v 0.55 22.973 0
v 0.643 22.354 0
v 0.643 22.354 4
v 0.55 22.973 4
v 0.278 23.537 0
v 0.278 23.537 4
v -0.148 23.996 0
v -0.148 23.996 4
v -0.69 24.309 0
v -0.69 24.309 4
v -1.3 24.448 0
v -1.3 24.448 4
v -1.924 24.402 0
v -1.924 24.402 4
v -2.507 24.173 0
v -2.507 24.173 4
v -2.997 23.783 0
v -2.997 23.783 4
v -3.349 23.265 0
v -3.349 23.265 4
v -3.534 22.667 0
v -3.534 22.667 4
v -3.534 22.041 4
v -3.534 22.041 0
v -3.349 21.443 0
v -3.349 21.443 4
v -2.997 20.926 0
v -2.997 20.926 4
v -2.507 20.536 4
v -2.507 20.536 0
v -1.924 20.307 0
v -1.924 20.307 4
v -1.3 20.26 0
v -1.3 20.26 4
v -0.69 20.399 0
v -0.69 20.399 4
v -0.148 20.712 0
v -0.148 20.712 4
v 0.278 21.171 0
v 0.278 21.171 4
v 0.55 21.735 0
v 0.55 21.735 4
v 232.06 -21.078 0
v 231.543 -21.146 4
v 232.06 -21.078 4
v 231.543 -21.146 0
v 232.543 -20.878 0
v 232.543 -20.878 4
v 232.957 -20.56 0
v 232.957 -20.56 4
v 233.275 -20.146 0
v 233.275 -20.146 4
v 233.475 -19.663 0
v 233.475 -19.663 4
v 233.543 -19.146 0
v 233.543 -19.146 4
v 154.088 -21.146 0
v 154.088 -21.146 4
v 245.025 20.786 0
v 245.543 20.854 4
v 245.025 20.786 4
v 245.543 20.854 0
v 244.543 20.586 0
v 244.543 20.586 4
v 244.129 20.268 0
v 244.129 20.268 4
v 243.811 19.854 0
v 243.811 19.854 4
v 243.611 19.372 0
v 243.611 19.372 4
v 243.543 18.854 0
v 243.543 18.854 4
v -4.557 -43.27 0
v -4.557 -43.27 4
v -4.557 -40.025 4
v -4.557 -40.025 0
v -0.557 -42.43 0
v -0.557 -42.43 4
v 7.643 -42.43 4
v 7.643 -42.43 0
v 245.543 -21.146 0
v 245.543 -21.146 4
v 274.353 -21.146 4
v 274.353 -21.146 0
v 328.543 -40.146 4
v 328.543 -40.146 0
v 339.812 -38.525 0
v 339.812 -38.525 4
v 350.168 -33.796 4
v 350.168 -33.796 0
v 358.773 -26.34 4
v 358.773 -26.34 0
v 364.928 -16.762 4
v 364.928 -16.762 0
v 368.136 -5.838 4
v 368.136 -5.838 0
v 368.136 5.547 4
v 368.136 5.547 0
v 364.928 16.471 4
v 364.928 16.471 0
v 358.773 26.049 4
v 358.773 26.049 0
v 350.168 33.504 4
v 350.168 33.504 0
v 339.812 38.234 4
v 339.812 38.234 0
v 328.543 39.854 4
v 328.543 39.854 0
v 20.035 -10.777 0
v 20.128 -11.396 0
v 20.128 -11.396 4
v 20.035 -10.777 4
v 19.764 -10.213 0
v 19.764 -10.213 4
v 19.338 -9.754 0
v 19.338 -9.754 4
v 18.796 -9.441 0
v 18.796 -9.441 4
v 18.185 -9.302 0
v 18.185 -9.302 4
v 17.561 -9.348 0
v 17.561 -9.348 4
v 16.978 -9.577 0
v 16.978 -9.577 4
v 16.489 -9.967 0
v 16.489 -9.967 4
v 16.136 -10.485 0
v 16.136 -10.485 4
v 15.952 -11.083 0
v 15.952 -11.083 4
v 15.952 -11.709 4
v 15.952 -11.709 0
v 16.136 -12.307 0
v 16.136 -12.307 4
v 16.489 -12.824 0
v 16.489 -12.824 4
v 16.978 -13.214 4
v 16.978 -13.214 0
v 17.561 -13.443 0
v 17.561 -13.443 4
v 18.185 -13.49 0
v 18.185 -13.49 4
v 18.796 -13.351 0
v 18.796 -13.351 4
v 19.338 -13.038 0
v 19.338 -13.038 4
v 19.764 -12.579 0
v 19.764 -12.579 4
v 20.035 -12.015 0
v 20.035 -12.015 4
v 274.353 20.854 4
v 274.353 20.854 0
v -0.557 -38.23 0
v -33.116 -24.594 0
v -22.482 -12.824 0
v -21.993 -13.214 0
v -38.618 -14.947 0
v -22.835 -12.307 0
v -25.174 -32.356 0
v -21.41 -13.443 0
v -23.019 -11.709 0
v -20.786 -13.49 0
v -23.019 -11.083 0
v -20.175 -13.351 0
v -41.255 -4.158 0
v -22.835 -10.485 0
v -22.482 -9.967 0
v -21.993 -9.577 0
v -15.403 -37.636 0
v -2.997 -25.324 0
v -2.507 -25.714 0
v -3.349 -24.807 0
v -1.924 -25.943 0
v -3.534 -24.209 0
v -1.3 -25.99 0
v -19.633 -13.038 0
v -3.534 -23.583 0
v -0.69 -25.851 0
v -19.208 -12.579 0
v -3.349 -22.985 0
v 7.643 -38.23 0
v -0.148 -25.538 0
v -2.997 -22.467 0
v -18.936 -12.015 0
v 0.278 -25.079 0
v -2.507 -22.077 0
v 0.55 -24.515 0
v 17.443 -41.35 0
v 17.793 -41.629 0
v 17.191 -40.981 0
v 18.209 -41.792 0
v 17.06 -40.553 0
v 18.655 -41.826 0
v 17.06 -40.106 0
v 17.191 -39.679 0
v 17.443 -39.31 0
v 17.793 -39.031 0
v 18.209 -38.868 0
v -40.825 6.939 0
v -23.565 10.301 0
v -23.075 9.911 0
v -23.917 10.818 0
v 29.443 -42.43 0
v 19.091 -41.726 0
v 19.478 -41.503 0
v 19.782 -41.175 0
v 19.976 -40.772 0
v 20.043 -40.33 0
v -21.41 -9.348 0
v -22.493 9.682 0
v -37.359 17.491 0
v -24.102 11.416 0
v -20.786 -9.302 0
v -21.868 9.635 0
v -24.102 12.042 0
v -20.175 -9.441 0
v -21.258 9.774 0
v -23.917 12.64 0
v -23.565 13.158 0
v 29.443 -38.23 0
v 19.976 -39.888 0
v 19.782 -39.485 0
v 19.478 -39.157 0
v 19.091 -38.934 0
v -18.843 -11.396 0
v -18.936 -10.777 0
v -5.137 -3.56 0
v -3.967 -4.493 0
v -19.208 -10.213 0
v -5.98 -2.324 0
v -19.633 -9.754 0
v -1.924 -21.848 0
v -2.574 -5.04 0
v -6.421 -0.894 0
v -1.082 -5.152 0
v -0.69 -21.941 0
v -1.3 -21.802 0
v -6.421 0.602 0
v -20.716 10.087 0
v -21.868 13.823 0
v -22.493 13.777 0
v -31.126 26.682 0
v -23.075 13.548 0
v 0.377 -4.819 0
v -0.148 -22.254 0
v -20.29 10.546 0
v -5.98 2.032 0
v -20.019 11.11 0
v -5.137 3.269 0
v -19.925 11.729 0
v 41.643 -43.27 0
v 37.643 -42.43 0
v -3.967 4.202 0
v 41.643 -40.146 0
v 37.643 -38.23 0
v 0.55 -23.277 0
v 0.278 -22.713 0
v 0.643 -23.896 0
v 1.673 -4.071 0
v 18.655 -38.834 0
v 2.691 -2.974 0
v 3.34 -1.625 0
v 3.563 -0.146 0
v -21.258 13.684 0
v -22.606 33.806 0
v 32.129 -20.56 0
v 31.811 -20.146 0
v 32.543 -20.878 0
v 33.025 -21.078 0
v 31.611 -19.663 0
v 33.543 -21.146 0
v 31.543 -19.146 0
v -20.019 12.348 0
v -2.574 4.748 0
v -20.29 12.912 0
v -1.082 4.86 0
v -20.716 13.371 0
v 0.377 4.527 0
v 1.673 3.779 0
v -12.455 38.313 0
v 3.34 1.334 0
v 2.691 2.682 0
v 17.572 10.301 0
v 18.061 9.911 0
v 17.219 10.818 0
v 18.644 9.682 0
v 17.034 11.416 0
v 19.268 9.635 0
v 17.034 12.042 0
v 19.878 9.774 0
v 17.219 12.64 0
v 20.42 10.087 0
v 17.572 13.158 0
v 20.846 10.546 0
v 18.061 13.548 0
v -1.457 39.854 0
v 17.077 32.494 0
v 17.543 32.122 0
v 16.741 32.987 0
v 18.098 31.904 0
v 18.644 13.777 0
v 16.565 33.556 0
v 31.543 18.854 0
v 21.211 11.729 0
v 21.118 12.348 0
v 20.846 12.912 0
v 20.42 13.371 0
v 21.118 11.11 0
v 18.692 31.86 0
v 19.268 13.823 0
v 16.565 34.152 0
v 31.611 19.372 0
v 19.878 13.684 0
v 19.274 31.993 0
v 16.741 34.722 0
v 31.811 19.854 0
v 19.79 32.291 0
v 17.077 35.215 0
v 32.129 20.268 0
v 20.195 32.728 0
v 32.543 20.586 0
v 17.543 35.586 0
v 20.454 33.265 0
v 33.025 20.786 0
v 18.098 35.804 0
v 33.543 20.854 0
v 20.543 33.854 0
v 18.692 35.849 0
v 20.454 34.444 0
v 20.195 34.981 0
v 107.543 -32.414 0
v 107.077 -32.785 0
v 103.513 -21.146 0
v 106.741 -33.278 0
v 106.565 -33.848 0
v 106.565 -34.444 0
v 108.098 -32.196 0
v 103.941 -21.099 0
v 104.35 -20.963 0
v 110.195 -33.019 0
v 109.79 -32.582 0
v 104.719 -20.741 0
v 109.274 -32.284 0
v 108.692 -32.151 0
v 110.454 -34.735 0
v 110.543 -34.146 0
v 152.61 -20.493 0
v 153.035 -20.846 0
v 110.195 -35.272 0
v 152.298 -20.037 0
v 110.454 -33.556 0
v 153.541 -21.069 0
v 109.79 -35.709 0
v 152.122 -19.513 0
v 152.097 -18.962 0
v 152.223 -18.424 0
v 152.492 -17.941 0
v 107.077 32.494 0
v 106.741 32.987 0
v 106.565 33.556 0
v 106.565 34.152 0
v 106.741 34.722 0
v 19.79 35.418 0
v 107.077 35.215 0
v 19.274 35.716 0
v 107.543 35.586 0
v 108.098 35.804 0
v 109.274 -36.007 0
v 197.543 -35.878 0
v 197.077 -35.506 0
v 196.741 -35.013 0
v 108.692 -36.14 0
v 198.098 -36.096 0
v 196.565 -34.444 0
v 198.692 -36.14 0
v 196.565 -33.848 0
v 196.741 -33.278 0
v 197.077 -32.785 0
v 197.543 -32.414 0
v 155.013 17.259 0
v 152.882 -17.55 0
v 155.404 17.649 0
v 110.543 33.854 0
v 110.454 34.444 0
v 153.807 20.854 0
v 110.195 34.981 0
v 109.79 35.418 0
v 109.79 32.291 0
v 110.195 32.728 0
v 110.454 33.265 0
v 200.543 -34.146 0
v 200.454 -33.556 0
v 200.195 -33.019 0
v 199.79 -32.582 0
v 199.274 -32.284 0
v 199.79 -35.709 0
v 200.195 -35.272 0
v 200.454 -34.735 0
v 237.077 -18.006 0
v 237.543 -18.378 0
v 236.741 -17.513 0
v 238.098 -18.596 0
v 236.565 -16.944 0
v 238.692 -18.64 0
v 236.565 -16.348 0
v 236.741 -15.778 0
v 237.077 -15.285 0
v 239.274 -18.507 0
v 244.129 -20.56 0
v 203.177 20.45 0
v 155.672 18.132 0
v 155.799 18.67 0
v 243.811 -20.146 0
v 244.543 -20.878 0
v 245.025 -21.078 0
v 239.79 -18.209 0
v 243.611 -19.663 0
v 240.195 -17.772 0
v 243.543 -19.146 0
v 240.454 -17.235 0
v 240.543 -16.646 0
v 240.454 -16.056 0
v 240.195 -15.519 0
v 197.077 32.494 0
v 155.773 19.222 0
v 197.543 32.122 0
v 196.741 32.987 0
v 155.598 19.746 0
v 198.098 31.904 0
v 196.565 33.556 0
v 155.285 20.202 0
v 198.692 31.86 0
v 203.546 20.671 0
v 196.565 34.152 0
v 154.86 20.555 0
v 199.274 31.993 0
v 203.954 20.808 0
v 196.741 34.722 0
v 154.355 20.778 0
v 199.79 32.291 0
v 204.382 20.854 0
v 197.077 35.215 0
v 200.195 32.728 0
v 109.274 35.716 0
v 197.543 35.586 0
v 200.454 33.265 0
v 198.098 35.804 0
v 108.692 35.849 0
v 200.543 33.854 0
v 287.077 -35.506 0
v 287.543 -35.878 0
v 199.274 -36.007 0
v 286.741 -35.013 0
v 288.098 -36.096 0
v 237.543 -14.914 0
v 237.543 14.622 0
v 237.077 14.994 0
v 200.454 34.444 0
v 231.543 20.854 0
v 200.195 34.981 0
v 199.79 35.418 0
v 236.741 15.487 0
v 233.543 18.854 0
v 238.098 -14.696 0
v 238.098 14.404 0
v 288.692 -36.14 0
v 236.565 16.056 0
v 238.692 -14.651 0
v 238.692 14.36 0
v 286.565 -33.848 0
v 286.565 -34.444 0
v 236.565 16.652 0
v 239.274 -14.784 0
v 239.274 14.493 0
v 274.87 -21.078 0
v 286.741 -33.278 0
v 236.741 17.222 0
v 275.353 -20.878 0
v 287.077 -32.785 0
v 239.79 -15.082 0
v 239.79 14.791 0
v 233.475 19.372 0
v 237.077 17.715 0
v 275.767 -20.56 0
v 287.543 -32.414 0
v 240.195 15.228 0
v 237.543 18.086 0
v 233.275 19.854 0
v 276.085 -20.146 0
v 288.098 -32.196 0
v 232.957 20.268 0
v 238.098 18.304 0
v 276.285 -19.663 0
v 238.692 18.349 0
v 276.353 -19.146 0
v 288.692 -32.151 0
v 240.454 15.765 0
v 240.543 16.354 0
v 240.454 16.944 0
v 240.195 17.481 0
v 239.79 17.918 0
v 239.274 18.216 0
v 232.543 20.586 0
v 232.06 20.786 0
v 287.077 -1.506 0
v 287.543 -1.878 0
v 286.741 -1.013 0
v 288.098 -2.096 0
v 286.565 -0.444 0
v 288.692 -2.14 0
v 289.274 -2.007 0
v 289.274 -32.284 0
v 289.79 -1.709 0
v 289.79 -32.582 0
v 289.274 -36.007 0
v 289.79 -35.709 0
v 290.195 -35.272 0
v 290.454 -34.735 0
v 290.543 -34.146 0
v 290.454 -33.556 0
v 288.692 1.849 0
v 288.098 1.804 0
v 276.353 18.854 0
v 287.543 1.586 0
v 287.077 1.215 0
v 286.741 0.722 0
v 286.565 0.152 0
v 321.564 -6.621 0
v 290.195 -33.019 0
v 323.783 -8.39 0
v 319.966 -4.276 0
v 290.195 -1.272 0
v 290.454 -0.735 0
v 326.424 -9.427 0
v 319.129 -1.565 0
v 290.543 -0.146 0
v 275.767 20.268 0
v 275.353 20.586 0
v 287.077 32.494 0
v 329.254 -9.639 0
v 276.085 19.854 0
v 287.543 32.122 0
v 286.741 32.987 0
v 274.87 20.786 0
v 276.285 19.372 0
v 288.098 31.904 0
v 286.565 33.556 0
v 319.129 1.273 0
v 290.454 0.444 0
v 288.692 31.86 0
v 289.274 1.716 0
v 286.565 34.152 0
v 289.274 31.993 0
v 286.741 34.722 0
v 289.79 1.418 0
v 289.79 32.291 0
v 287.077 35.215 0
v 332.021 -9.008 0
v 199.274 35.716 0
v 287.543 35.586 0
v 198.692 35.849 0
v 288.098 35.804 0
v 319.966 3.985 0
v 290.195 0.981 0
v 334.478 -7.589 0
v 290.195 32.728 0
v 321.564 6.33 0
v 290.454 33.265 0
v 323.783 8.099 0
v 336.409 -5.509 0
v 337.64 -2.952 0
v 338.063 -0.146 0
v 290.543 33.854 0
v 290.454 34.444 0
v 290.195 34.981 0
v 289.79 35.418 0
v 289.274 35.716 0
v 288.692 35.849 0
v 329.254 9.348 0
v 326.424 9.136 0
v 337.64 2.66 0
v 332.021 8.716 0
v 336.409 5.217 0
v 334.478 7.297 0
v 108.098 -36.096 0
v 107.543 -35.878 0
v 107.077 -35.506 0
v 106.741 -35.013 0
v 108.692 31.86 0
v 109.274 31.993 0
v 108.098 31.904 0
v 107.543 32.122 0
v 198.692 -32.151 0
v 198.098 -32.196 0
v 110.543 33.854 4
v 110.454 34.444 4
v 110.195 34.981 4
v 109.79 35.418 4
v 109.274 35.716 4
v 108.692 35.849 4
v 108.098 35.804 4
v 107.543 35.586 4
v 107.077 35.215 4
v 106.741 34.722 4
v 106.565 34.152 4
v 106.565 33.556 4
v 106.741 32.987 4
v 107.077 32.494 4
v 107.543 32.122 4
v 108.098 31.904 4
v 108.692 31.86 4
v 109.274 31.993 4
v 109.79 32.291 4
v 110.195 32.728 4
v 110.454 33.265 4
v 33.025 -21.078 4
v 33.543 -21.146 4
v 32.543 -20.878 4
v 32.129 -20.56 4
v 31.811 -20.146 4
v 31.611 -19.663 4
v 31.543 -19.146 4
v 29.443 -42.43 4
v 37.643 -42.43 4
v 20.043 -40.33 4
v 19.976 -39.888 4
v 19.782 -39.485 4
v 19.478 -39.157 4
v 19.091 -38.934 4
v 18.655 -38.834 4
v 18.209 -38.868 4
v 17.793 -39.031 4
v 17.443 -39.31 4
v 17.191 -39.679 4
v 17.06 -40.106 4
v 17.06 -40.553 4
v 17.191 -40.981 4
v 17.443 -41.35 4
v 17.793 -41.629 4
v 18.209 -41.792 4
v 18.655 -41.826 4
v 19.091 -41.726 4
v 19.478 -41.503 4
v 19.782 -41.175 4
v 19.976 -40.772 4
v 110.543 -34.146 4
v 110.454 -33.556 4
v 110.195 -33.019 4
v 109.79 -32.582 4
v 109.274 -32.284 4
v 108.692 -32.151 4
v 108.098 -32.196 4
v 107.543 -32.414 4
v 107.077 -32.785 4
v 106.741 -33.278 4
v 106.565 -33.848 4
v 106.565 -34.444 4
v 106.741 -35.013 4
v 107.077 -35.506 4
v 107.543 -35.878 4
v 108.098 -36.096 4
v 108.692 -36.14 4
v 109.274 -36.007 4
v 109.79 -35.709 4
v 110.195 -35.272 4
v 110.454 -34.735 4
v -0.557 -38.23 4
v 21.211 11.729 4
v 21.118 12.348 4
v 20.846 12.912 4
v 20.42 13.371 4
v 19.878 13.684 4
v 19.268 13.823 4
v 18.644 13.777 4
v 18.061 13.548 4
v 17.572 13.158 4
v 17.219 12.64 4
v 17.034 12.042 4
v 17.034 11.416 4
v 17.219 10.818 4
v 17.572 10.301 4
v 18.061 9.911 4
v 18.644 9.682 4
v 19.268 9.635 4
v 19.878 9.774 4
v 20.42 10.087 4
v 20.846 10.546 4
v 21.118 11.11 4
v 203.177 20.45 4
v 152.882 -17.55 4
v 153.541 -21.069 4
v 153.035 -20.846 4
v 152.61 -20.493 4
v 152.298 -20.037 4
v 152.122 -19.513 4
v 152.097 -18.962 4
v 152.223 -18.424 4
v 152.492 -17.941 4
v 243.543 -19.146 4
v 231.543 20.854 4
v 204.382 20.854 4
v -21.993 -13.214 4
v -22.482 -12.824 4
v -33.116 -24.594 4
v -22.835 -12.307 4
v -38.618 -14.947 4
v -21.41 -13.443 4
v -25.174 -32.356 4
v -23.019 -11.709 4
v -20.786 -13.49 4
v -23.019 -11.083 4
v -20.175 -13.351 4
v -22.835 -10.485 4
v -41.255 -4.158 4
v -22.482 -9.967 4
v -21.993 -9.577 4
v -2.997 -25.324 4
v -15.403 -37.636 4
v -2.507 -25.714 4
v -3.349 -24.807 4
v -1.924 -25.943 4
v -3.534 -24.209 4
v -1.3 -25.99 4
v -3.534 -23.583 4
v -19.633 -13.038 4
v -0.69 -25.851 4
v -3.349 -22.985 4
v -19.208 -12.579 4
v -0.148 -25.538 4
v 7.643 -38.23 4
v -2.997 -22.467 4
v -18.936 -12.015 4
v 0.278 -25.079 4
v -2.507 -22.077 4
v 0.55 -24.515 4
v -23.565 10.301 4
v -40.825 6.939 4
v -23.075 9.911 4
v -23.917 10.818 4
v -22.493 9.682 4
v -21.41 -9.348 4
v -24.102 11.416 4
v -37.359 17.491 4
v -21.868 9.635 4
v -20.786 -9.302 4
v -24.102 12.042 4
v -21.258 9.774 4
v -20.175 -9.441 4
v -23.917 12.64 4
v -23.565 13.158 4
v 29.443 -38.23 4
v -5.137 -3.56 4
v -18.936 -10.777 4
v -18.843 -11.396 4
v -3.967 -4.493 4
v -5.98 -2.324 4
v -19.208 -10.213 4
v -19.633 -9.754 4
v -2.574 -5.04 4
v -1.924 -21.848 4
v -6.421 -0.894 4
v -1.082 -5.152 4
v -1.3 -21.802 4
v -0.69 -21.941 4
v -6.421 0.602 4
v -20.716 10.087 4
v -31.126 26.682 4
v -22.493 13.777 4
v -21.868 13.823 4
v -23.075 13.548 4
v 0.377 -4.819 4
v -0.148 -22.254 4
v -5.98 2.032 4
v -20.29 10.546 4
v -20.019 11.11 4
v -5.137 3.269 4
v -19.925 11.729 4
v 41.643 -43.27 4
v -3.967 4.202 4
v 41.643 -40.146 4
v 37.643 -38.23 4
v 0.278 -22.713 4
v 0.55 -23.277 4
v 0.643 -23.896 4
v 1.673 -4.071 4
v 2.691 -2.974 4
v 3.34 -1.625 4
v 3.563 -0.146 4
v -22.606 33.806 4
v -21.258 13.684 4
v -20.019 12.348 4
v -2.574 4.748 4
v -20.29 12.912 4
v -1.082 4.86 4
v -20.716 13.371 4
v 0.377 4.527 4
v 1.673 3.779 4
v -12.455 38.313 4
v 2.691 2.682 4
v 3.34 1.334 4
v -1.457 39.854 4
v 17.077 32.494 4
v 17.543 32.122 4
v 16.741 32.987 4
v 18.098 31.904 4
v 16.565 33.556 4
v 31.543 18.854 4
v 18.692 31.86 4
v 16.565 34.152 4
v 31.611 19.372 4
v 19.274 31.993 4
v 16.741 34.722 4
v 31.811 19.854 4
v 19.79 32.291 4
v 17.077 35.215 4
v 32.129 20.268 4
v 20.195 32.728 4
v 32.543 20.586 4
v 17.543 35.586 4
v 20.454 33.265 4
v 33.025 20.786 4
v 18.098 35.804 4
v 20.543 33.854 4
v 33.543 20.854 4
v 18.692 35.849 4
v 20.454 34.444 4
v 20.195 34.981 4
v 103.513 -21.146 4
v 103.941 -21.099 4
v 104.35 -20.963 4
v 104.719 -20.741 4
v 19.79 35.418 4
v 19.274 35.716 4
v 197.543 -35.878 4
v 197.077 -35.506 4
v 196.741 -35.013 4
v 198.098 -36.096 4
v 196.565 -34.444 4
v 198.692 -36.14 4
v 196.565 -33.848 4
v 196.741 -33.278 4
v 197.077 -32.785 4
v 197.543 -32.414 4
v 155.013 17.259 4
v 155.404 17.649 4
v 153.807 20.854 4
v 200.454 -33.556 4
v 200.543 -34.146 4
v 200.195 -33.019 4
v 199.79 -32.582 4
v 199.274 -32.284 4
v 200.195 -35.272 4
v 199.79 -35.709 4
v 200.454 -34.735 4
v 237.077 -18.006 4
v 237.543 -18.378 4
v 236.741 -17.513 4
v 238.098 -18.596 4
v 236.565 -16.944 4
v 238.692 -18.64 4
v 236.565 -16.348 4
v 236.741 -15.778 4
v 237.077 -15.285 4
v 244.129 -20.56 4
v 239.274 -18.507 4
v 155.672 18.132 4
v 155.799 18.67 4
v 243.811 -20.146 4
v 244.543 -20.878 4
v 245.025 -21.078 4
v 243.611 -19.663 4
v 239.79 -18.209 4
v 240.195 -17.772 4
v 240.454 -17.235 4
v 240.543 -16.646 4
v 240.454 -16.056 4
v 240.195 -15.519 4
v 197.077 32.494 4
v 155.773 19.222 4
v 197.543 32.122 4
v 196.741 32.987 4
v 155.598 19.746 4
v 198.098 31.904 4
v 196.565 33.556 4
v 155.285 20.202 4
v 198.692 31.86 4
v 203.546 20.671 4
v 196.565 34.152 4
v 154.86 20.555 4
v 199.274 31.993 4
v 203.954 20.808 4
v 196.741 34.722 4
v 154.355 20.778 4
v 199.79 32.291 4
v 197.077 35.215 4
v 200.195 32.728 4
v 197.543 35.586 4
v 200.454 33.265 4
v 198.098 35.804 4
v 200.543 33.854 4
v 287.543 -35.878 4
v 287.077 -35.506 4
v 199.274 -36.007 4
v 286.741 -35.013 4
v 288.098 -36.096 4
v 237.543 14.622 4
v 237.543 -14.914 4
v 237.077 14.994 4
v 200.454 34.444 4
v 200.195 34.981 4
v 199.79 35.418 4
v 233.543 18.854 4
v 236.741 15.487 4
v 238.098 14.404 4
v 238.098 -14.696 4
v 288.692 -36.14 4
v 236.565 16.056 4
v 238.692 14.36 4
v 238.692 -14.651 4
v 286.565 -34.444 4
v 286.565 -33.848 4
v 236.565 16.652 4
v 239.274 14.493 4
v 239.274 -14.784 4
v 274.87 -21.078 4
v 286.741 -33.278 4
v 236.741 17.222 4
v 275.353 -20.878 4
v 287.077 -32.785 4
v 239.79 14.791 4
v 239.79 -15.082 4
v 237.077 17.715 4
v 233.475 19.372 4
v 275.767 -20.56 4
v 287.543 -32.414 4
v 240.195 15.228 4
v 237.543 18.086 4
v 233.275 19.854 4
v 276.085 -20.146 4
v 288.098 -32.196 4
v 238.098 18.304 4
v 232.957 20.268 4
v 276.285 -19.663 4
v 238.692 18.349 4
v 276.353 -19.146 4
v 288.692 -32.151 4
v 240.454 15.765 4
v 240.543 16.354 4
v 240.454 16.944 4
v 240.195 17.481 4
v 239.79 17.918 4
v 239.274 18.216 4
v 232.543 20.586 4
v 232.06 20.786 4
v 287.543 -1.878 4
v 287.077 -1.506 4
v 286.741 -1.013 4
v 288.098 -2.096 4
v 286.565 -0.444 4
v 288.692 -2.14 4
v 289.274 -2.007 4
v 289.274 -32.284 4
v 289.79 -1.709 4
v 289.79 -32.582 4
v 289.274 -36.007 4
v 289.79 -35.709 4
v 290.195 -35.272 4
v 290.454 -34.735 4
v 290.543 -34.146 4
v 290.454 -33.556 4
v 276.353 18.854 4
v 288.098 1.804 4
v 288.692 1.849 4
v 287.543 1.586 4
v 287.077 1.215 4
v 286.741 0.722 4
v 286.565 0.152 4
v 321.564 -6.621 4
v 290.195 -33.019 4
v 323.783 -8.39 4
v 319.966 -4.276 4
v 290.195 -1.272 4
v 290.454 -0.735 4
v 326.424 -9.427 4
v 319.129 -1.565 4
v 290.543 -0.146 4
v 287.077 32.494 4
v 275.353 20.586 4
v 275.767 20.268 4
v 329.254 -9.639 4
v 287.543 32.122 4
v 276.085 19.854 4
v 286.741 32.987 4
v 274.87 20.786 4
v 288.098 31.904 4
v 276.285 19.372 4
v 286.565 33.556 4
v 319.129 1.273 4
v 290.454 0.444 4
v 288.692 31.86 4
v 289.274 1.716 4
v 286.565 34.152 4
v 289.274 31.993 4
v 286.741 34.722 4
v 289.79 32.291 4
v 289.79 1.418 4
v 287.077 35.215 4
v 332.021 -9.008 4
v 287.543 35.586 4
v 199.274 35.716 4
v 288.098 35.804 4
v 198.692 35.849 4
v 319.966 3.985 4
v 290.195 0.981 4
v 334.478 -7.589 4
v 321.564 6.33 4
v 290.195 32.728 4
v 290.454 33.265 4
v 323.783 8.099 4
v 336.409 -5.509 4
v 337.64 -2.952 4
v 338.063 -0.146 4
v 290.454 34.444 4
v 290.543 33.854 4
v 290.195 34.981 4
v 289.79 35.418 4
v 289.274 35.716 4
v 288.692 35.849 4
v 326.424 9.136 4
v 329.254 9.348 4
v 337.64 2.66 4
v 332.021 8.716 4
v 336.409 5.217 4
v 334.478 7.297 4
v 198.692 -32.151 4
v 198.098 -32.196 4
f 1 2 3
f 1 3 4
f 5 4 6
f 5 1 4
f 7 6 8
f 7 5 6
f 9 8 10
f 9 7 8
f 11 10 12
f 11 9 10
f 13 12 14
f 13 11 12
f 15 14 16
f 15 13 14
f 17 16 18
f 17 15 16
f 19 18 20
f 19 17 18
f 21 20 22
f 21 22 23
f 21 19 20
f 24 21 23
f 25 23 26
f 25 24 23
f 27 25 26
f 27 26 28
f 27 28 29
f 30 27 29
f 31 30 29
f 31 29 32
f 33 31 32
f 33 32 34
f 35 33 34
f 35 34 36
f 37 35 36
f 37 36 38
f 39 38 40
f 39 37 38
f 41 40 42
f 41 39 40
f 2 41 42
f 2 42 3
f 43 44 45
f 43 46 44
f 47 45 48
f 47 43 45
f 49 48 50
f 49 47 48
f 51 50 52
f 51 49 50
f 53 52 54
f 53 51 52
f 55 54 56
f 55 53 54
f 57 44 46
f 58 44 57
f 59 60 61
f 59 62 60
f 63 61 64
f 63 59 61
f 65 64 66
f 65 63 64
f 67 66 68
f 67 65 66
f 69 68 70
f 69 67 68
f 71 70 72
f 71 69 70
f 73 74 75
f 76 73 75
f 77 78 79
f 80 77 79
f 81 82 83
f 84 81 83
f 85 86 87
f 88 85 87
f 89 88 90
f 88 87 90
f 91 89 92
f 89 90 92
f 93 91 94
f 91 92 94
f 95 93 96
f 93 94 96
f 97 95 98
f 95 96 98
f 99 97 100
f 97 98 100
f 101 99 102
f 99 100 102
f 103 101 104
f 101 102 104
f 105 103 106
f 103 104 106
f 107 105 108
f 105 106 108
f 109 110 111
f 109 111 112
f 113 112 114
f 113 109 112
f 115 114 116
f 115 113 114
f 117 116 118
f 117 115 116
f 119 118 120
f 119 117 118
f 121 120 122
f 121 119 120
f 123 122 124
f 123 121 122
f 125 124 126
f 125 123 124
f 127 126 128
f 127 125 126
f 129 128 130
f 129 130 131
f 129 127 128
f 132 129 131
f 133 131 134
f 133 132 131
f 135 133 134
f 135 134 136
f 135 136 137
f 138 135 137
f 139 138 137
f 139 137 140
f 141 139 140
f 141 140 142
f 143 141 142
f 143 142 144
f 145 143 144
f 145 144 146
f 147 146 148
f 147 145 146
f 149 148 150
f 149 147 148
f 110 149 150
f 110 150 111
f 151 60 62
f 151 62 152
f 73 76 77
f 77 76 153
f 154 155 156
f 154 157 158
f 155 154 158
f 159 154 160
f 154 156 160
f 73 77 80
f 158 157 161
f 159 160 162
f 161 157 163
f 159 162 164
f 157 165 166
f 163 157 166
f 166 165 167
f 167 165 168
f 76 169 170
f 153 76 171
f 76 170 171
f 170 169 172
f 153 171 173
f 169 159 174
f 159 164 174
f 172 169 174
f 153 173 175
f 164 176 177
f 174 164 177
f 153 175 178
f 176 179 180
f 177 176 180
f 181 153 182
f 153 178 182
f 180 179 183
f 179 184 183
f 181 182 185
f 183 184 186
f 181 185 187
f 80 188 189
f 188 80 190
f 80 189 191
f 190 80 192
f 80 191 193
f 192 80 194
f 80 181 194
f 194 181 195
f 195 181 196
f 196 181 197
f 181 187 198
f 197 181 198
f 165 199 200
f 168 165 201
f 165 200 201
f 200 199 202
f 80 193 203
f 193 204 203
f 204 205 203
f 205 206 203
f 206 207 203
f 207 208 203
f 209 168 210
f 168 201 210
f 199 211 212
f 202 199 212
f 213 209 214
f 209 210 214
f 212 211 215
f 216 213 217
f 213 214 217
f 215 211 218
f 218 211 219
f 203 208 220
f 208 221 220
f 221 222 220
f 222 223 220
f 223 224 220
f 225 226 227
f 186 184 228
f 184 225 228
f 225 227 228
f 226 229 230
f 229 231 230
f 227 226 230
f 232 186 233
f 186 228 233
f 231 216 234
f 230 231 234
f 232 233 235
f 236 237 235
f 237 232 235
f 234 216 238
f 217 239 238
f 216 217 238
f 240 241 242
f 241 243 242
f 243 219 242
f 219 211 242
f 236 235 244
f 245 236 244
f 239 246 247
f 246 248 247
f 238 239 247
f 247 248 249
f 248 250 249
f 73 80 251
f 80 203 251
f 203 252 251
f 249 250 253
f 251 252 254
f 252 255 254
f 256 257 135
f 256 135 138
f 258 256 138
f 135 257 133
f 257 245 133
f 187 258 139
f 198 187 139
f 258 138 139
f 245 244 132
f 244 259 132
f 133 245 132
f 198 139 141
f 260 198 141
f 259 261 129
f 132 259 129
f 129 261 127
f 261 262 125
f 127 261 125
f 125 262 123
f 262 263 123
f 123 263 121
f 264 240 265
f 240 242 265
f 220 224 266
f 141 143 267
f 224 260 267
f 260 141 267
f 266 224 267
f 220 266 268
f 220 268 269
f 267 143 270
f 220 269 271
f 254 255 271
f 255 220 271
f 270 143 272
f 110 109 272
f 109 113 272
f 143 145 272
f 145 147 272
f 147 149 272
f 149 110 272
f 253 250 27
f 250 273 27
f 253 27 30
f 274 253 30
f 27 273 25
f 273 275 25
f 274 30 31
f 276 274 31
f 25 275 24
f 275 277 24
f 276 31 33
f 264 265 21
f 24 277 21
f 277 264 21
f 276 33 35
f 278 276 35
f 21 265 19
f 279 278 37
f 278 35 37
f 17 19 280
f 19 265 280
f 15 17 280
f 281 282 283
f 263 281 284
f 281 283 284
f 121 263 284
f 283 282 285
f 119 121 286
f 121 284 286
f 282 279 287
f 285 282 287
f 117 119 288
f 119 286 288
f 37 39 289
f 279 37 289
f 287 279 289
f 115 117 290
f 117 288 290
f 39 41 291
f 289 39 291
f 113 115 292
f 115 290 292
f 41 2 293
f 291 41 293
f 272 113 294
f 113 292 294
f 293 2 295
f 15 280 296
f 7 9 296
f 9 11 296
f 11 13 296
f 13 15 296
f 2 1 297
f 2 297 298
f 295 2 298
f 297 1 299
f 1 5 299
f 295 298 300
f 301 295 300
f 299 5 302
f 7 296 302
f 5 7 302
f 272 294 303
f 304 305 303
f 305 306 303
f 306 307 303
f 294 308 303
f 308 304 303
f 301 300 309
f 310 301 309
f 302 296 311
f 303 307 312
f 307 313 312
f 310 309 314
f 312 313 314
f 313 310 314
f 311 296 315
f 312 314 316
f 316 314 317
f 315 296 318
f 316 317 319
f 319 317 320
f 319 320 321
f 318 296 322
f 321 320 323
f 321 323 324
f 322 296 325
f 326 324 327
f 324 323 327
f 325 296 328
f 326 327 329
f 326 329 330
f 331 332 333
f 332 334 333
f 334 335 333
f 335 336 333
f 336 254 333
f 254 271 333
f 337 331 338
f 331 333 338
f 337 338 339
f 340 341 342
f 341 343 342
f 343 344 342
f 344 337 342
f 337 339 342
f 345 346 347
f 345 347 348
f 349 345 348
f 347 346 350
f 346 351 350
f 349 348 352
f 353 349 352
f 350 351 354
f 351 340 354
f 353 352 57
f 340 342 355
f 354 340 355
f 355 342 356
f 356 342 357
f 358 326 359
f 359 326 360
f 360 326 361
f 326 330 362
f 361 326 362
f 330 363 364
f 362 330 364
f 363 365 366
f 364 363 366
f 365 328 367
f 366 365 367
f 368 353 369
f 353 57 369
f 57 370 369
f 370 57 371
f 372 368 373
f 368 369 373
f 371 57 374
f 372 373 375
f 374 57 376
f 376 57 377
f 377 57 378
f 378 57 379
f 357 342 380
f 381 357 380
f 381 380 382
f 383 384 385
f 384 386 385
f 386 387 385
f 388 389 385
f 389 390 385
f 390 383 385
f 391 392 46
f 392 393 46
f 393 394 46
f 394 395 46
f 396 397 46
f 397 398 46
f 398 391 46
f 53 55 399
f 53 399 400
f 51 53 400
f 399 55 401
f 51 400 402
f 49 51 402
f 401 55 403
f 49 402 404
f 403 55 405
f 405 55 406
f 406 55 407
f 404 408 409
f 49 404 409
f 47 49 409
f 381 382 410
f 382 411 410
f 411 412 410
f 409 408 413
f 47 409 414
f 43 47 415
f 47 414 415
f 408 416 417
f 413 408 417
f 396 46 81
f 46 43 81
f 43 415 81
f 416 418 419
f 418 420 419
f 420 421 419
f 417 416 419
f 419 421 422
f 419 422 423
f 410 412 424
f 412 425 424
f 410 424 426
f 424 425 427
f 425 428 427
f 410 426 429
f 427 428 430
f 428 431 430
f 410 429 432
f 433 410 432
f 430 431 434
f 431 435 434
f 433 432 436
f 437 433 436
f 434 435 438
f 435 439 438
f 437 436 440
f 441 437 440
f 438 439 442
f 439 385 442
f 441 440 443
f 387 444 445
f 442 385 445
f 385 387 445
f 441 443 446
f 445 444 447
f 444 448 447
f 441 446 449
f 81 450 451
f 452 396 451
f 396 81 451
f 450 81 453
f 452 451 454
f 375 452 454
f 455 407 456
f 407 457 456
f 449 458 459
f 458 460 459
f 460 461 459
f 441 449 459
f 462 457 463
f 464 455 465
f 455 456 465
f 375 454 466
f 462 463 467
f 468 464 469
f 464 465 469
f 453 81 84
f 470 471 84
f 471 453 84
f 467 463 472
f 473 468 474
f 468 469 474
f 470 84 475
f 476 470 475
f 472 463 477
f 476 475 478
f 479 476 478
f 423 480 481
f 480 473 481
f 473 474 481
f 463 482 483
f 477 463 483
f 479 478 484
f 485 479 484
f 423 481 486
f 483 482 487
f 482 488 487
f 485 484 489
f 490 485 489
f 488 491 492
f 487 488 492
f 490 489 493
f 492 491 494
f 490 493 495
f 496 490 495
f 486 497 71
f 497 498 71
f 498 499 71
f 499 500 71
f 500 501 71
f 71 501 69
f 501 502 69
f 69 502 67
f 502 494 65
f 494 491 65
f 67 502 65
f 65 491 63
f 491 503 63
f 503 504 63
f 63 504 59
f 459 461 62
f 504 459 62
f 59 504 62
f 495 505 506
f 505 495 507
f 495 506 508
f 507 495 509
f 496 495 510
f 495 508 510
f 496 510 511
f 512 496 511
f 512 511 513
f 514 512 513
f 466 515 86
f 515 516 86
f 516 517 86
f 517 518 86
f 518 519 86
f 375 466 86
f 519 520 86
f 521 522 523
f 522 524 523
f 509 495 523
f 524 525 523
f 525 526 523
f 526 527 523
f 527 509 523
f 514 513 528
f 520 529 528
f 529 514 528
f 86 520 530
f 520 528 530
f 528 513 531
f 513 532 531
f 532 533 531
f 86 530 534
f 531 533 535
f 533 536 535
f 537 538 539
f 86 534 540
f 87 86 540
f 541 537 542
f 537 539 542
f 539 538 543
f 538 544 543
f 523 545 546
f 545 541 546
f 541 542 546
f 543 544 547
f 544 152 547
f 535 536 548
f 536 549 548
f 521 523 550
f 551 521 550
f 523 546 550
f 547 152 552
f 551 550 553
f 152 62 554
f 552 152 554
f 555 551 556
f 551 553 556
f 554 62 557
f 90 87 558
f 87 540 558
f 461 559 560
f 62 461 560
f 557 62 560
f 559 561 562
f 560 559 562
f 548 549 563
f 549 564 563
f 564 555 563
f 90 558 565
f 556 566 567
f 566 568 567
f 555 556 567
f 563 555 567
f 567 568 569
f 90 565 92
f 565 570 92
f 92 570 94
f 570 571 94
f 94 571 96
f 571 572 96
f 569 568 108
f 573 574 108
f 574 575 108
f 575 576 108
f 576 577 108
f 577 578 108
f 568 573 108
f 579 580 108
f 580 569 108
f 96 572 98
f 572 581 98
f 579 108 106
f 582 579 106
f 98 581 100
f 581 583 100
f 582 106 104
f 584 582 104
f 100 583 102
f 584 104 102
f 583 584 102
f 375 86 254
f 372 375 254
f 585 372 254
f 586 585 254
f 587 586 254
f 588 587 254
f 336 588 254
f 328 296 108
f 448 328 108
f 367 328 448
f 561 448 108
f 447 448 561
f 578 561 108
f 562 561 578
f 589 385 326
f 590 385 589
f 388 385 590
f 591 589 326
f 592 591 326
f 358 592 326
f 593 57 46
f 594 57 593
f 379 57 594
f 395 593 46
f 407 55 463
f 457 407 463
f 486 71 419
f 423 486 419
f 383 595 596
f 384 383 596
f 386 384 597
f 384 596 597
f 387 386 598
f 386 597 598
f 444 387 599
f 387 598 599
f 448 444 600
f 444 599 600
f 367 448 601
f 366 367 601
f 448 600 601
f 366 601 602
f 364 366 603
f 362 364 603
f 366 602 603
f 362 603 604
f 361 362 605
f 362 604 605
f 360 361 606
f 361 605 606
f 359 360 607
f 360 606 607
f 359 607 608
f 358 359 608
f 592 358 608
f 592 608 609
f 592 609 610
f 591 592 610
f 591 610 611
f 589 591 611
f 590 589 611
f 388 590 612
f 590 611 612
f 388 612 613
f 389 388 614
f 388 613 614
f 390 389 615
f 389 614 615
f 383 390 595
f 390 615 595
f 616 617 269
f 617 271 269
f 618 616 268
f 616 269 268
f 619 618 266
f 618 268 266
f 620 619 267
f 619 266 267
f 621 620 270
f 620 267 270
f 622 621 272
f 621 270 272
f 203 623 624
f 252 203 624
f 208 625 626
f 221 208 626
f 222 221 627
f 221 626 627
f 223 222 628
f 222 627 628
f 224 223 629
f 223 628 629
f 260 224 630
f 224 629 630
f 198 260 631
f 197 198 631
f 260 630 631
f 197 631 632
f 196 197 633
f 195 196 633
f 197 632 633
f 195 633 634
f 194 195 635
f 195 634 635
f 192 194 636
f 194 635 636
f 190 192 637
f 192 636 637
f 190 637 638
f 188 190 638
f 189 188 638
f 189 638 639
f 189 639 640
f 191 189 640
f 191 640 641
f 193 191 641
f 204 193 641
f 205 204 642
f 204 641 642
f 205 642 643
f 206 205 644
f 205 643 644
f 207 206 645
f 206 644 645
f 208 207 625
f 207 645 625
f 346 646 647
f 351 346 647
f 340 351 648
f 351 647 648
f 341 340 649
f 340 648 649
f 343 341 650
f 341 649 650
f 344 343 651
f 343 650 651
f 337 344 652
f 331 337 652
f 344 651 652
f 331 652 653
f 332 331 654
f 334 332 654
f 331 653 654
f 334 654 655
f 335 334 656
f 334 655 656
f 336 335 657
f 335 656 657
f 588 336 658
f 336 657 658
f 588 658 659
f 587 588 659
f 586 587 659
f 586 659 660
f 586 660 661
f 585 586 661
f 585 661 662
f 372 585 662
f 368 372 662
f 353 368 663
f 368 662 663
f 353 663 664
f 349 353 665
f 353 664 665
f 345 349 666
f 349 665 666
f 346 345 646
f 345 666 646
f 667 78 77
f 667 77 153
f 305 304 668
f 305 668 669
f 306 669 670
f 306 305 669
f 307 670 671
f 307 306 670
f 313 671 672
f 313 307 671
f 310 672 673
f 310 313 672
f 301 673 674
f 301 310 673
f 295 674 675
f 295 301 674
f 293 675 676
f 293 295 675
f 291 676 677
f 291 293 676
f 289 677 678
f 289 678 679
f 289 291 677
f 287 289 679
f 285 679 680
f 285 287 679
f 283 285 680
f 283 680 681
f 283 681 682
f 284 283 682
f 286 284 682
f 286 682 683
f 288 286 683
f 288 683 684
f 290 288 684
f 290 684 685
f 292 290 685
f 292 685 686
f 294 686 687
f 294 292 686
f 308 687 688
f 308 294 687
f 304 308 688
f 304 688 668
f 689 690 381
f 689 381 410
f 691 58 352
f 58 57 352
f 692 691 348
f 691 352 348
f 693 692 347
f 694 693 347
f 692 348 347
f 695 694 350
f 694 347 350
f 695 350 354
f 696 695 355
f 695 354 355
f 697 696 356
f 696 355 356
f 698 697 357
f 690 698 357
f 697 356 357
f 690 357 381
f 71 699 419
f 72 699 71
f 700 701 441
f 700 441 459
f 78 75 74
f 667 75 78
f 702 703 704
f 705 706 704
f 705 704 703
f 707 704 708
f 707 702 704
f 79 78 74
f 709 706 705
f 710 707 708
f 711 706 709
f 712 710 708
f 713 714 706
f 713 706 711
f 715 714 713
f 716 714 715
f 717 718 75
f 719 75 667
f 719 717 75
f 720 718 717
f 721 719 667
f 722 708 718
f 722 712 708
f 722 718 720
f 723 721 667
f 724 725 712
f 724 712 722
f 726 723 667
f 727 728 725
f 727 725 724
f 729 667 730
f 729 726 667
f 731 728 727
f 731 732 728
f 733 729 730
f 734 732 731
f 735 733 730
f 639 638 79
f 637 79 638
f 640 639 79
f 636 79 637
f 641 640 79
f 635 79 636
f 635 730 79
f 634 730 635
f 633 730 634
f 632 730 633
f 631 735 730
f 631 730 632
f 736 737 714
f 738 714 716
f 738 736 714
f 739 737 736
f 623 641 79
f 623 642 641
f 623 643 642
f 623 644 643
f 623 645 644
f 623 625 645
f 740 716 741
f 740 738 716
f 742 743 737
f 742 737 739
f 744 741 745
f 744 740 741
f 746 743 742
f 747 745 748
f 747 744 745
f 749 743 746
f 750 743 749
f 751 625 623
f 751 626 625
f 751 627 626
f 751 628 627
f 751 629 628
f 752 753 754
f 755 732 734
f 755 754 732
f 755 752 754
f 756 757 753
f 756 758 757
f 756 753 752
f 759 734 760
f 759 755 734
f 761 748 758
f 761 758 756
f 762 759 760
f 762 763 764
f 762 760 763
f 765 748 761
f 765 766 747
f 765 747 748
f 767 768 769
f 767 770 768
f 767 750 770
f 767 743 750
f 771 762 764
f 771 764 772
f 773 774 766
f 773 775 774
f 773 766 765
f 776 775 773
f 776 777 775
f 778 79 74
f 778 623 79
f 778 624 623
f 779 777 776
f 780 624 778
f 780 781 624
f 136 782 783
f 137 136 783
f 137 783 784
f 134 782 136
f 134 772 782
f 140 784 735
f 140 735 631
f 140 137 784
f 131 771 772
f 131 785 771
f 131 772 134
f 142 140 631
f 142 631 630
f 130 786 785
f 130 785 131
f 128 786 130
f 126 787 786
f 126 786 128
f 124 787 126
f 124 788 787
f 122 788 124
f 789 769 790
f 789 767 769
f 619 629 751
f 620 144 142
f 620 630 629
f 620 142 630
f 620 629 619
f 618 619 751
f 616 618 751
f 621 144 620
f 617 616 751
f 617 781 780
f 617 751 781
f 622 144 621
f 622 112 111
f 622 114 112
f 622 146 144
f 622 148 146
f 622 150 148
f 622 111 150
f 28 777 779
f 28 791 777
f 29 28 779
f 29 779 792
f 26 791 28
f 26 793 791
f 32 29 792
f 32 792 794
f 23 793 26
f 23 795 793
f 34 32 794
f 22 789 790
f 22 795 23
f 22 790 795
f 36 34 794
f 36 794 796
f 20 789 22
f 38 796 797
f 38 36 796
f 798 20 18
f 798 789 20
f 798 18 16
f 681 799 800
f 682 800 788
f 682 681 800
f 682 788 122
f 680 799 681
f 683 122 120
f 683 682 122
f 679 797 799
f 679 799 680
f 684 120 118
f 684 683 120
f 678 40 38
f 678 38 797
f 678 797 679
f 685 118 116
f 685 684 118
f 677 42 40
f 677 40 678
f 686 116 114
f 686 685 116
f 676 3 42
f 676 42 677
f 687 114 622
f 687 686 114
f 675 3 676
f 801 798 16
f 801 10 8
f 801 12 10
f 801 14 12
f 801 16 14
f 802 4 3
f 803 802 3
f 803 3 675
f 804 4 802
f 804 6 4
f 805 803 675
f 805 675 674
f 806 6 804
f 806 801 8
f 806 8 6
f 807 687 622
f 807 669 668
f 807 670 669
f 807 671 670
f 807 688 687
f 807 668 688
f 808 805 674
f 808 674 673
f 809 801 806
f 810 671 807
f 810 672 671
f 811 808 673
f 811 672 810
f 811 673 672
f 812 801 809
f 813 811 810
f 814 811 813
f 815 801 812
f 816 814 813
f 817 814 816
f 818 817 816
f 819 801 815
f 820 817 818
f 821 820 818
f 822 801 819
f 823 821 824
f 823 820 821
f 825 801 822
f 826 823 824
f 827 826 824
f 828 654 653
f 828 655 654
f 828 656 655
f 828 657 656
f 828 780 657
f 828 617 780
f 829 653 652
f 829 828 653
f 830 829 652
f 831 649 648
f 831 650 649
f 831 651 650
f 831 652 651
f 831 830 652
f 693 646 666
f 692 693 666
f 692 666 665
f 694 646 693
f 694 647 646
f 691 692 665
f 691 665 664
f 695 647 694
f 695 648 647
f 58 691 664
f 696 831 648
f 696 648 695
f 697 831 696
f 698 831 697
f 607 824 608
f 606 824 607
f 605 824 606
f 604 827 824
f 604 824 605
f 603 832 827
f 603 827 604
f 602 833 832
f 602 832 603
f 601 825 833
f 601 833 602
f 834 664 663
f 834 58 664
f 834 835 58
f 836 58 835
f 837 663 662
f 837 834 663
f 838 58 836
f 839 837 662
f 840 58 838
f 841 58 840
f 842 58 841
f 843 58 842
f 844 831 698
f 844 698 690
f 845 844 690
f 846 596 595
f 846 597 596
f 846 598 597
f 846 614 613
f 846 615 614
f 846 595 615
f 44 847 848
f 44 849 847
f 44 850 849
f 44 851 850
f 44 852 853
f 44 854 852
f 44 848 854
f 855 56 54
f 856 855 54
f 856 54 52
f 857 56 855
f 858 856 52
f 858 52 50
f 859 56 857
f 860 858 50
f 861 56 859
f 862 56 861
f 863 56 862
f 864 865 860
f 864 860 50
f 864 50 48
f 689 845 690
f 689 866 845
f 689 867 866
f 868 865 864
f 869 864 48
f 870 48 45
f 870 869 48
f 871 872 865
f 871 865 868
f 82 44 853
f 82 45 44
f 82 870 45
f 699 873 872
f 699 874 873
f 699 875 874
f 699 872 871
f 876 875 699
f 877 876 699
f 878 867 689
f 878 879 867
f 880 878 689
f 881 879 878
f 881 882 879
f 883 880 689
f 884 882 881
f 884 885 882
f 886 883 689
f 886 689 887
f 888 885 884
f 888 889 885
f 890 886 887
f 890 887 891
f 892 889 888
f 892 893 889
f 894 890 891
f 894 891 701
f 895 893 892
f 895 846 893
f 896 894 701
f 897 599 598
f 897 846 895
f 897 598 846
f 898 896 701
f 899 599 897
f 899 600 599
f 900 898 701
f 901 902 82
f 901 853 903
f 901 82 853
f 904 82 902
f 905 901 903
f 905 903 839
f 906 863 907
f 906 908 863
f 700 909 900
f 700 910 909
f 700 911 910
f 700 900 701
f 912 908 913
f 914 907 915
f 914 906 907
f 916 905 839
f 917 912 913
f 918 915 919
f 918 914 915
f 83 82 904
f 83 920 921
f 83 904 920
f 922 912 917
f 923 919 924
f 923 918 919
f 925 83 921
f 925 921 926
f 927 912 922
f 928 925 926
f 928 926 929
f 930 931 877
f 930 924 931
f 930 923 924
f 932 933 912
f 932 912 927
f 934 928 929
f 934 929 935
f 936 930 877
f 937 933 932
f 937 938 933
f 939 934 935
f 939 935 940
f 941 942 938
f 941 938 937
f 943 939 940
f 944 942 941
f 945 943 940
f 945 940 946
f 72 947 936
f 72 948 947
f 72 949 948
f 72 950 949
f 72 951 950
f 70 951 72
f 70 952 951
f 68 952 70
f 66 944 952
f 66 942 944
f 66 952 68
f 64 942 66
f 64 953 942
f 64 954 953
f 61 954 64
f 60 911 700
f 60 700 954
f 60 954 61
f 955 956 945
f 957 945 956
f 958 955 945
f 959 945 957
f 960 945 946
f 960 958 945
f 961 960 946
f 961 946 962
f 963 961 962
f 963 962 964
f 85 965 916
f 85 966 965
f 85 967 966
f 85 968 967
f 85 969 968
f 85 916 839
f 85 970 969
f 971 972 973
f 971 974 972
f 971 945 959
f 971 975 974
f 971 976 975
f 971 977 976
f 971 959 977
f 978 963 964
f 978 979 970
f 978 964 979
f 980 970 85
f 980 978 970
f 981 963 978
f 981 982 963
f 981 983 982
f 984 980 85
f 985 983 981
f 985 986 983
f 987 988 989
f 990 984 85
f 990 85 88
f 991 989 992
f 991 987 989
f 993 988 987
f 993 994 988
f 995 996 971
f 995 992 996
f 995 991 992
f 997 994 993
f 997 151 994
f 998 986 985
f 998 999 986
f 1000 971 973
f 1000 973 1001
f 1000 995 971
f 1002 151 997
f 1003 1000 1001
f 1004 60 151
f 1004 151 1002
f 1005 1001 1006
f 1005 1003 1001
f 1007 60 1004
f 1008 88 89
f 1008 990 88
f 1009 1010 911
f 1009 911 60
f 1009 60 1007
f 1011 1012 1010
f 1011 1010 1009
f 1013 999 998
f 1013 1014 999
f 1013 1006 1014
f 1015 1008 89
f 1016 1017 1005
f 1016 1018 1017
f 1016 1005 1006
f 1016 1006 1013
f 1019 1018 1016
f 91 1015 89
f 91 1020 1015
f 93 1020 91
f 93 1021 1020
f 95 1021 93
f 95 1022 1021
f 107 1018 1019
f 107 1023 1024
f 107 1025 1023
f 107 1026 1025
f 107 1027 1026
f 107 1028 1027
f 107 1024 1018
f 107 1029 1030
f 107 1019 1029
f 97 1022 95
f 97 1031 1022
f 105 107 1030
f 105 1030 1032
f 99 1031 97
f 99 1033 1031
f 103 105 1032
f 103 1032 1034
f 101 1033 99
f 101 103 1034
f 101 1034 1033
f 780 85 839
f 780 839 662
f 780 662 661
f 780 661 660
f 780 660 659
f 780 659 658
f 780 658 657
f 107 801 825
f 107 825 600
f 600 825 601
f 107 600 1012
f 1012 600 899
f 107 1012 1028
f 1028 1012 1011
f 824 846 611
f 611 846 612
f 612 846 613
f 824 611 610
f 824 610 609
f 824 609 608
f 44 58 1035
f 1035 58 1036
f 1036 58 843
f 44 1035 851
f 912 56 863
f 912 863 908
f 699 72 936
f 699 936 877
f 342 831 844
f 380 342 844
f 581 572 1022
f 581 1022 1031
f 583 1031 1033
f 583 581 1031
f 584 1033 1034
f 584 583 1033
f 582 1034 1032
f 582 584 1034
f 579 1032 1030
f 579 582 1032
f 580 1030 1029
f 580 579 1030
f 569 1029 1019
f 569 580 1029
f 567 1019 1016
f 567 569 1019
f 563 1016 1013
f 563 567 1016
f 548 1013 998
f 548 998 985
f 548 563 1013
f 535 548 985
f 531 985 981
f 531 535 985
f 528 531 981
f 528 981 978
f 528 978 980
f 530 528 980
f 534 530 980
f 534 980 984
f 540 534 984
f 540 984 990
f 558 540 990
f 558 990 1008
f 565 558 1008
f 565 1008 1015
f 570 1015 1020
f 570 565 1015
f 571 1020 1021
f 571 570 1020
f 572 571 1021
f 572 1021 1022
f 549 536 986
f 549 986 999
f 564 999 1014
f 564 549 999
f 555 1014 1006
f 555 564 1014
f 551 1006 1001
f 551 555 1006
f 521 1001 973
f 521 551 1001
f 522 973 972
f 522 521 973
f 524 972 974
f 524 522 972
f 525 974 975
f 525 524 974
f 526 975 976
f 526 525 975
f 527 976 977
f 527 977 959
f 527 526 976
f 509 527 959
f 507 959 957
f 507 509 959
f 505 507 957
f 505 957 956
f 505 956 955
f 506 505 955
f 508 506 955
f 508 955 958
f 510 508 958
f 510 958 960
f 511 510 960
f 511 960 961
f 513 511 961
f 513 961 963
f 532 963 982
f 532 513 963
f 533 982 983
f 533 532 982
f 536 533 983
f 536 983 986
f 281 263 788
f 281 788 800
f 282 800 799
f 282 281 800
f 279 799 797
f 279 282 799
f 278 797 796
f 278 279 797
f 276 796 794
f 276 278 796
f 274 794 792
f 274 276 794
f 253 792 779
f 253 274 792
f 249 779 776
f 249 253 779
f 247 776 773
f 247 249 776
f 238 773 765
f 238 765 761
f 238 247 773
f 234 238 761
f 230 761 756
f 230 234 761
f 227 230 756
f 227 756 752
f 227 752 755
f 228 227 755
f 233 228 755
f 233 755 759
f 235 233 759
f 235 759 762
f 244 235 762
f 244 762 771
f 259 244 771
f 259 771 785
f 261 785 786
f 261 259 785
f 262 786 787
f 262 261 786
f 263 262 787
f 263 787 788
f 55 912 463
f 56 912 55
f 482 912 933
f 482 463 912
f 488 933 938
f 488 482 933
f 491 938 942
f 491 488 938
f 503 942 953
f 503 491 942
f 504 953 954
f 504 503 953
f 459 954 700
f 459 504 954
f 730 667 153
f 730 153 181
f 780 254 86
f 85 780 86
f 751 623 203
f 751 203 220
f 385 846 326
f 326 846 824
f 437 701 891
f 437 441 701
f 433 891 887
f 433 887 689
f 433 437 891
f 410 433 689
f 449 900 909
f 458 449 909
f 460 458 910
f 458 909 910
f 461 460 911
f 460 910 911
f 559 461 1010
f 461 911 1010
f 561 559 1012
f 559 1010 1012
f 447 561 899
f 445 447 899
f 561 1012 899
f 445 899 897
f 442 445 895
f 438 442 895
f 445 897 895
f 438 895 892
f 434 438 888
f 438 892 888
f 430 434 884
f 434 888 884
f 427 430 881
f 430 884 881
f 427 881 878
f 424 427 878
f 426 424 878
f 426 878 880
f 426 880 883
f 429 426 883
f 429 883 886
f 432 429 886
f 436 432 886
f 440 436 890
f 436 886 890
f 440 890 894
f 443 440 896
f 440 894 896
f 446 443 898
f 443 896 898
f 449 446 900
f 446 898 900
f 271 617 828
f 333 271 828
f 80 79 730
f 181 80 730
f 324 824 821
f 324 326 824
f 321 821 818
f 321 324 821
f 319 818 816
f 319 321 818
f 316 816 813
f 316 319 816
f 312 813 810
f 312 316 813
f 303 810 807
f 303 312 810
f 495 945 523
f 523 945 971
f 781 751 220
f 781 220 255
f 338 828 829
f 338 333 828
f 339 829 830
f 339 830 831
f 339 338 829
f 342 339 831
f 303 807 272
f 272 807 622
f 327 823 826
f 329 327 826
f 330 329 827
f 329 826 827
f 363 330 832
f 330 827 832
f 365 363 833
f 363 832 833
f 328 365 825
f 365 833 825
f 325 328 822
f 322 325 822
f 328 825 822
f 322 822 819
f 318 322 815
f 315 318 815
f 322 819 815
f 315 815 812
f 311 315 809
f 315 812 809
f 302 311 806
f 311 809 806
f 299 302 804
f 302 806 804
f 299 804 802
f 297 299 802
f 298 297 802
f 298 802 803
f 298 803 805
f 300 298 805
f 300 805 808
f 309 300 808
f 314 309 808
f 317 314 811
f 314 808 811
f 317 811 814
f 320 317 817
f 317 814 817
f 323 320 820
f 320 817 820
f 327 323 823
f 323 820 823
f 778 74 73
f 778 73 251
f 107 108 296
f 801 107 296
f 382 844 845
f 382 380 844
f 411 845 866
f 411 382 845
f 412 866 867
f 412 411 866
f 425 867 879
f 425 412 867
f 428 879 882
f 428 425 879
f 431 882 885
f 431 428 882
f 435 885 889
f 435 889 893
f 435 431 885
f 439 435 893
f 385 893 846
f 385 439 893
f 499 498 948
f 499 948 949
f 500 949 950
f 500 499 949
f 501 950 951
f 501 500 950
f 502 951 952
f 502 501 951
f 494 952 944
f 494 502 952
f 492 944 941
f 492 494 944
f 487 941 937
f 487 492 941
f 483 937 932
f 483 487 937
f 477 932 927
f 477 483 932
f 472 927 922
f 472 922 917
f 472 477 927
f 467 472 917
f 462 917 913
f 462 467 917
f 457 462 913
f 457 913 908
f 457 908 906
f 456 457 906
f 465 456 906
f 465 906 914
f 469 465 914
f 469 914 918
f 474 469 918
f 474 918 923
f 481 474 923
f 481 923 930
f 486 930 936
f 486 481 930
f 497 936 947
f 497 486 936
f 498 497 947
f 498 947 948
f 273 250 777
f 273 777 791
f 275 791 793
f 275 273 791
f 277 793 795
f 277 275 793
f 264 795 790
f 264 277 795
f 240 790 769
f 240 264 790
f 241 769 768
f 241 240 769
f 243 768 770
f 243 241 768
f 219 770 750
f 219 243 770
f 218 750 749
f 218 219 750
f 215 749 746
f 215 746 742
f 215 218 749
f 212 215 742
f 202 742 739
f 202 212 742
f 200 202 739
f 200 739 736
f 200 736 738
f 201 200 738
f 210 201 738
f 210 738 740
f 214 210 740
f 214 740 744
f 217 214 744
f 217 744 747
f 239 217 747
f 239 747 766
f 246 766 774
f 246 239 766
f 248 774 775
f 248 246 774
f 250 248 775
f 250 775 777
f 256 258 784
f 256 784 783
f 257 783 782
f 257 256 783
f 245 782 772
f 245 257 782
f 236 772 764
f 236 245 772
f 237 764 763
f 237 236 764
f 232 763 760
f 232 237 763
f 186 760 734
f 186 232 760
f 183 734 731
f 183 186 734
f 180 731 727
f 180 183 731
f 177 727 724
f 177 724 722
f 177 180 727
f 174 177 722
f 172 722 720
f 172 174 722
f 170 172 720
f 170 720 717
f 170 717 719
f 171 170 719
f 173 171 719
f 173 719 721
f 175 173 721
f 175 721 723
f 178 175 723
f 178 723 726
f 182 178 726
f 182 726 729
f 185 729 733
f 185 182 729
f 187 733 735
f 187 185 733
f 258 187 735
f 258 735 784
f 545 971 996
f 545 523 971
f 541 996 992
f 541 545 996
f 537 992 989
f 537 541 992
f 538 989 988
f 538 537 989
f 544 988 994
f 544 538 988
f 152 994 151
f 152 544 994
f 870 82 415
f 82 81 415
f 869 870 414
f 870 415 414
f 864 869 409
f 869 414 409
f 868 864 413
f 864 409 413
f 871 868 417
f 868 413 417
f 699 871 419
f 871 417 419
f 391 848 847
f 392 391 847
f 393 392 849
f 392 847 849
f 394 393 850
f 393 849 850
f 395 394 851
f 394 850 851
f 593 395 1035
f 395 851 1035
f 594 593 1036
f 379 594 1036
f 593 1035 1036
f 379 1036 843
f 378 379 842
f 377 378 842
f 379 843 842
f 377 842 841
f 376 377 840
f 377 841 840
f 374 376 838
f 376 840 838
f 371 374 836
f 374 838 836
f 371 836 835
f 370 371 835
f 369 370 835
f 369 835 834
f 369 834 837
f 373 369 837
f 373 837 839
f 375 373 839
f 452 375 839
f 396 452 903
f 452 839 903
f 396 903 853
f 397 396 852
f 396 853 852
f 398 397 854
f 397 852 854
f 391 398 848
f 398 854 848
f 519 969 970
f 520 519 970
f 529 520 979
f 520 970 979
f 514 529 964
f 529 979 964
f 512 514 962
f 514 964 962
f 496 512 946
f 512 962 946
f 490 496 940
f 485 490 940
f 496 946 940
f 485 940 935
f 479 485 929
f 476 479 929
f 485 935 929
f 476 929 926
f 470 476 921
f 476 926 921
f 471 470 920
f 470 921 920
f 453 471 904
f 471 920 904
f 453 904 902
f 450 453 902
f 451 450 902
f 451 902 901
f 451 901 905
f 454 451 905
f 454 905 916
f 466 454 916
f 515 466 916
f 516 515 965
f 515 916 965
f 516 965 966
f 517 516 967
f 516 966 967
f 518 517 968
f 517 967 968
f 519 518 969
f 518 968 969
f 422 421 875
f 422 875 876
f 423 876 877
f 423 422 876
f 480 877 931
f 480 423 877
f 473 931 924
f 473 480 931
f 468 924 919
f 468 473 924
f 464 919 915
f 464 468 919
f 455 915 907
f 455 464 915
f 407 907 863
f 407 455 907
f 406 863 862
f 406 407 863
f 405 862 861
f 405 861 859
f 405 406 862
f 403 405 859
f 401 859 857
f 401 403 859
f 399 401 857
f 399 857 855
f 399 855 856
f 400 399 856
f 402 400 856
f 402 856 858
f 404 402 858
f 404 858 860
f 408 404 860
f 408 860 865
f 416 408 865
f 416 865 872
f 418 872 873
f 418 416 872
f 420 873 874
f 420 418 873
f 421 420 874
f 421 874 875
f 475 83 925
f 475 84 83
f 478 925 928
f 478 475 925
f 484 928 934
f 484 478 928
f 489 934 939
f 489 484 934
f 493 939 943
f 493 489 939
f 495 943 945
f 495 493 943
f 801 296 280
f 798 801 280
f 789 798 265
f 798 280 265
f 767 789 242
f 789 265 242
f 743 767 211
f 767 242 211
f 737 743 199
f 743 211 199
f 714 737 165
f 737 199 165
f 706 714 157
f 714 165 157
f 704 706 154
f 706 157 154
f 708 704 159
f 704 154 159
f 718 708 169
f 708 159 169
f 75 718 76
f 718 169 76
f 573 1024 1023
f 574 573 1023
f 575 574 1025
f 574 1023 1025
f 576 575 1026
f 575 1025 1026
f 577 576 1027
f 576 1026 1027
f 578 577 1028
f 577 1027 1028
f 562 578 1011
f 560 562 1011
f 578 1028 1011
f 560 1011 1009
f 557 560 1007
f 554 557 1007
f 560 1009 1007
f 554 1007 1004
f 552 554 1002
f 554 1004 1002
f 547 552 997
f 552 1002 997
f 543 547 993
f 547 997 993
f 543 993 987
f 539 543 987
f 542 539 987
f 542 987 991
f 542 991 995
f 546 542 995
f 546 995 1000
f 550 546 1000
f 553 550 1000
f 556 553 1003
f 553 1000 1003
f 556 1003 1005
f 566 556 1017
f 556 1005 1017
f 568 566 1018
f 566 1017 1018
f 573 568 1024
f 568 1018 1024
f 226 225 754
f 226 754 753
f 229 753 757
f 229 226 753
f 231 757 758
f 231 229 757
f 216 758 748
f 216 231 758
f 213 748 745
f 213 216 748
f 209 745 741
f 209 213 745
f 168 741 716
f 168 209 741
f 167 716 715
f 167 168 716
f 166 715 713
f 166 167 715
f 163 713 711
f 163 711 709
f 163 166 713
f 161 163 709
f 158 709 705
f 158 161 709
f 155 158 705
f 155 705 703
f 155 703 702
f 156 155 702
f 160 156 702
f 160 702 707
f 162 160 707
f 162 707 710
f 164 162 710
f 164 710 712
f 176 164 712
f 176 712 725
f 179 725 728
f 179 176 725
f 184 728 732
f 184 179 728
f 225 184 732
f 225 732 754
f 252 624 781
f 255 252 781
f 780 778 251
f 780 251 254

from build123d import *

# Parameters (mm, degrees)
SKETCH_1_R          = 2.1
SKETCH_1_R_2        = 5.02
SKETCH_1_R_3        = 2
SKETCH_1_R_4        = 9.52
EXTRUDE_1_DEPTH     = 4
SKETCH_3_W          = 46.2
SKETCH_3_H          = 3.817212264
EXTRUDE_2_DEPTH     = 4
SKETCH_2_R          = 2
SKETCH_2_R_2        = 1.5
SKETCH_2_W          = 32.809844138
SKETCH_2_H          = 42
SKETCH_2_W_2        = 8.2
SKETCH_2_H_2        = 4.2
CUT_EXTRUDE_1_DEPTH = 4
FILLET_1_R          = 2


with BuildPart() as part:
    # 草图1 → 凸台-拉伸1 (new body)
    with BuildSketch(Plane.XY):
        with BuildLine():
            ThreePointArc((-1.457142857, 39.854285714), (-41.457142857, -0.145714286), (-1.457142857, -40.145714286))
            Line((-1.457142857, -40.145714286), (328.542857143, -40.145714286))
            ThreePointArc((328.542857143, -40.145714286), (368.542857143, -0.145714286), (328.542857143, 39.854285714))
            Line((328.542857143, 39.854285714), (-1.457142857, 39.854285714))
        make_face()
        with Locations((-1.457142857, -23.895714286)):
            Circle(SKETCH_1_R, mode=Mode.SUBTRACT)
        with Locations((-20.942714442, -11.395714286)):
            Circle(SKETCH_1_R, mode=Mode.SUBTRACT)
        with Locations((18.028428728, -11.395714286)):
            Circle(SKETCH_1_R, mode=Mode.SUBTRACT)
        with Locations((-1.457142857, -0.145714286)):
            Circle(SKETCH_1_R_2, mode=Mode.SUBTRACT)
        with Locations((238.542857143, -16.645714286)):
            Circle(SKETCH_1_R_3, mode=Mode.SUBTRACT)
        with Locations((288.542857143, -0.145714286)):
            Circle(SKETCH_1_R_3, mode=Mode.SUBTRACT)
        with Locations((328.542857143, -0.145714286)):
            Circle(SKETCH_1_R_4, mode=Mode.SUBTRACT)
        with Locations((-22.025246197, 11.729285714)):
            Circle(SKETCH_1_R, mode=Mode.SUBTRACT)
        with Locations((19.110960483, 11.729285714)):
            Circle(SKETCH_1_R, mode=Mode.SUBTRACT)
        with Locations((-1.457142857, 22.354285714)):
            Circle(SKETCH_1_R, mode=Mode.SUBTRACT)
        with Locations((238.542857143, 16.354285714)):
            Circle(SKETCH_1_R_3, mode=Mode.SUBTRACT)
    extrude(amount=EXTRUDE_1_DEPTH)

    # 草图3 → 凸台-拉伸2 (add)
    with BuildSketch(Plane.XY.offset(4)):
        with Locations((18.542857143, -41.36131722)):
            Rectangle(SKETCH_3_W, SKETCH_3_H)
    extrude(amount=-EXTRUDE_2_DEPTH)

    # 草图2 → 切除-拉伸1 (cut)
    with BuildSketch(Plane.XY.offset(4)):
        with Locations((18.542857143, 33.854285714)):
            Circle(SKETCH_2_R)
        with Locations((108.542857143, 33.854285714)):
            Circle(SKETCH_2_R)
        with Locations((198.542857143, 33.854285714)):
            Circle(SKETCH_2_R)
        with Locations((288.542857143, 33.854285714)):
            Circle(SKETCH_2_R)
        with Locations((108.542857143, -34.145714286)):
            Circle(SKETCH_2_R)
        with Locations((198.542857143, -34.145714286)):
            Circle(SKETCH_2_R)
        with Locations((288.542857143, -34.145714286)):
            Circle(SKETCH_2_R)
        with Locations((18.542857143, -40.329923352)):
            Circle(SKETCH_2_R_2)
        Polygon((31.542857143, -21.145714286), (104.183898028, -21.145714286), (159.772133322, 20.854285714), (31.542857143, 20.854285714), align=None)
        Polygon((148.123425102, -21.145714286), (203.711660396, 20.854285714), (233.542857143, 20.854285714), (233.542857143, -21.145714286), align=None)
        with Locations((259.947779212, -0.145714286)):
            Rectangle(SKETCH_2_W, SKETCH_2_H)
        with Locations((33.542857143, -40.329923352)):
            Rectangle(SKETCH_2_W_2, SKETCH_2_H_2)
        with Locations((3.542857143, -40.329923352)):
            Rectangle(SKETCH_2_W_2, SKETCH_2_H_2)
    extrude(amount=-CUT_EXTRUDE_1_DEPTH, mode=Mode.SUBTRACT)

    # 圆角1
    fillet_1_edges = [part.edges().sort_by_distance(p)[0] for p in [
        (243.542857143, 20.854285714, 2),
        (276.352701281, 20.854285714, 2),
        (276.352701281, -21.145714286, 2),
        (243.542857143, -21.145714286, 2),
        (31.542857143, -21.145714286, 2),
        (31.542857143, 20.854285714, 2),
        (159.772133322, 20.854285714, 2),
        (104.183898028, -21.145714286, 2),
        (203.711660396, 20.854285714, 2),
        (233.542857143, 20.854285714, 2),
        (233.542857143, -21.145714286, 2),
        (148.123425102, -21.145714286, 2),
    ]]
    fillet(fillet_1_edges, radius=FILLET_1_R)


solid = part.part
